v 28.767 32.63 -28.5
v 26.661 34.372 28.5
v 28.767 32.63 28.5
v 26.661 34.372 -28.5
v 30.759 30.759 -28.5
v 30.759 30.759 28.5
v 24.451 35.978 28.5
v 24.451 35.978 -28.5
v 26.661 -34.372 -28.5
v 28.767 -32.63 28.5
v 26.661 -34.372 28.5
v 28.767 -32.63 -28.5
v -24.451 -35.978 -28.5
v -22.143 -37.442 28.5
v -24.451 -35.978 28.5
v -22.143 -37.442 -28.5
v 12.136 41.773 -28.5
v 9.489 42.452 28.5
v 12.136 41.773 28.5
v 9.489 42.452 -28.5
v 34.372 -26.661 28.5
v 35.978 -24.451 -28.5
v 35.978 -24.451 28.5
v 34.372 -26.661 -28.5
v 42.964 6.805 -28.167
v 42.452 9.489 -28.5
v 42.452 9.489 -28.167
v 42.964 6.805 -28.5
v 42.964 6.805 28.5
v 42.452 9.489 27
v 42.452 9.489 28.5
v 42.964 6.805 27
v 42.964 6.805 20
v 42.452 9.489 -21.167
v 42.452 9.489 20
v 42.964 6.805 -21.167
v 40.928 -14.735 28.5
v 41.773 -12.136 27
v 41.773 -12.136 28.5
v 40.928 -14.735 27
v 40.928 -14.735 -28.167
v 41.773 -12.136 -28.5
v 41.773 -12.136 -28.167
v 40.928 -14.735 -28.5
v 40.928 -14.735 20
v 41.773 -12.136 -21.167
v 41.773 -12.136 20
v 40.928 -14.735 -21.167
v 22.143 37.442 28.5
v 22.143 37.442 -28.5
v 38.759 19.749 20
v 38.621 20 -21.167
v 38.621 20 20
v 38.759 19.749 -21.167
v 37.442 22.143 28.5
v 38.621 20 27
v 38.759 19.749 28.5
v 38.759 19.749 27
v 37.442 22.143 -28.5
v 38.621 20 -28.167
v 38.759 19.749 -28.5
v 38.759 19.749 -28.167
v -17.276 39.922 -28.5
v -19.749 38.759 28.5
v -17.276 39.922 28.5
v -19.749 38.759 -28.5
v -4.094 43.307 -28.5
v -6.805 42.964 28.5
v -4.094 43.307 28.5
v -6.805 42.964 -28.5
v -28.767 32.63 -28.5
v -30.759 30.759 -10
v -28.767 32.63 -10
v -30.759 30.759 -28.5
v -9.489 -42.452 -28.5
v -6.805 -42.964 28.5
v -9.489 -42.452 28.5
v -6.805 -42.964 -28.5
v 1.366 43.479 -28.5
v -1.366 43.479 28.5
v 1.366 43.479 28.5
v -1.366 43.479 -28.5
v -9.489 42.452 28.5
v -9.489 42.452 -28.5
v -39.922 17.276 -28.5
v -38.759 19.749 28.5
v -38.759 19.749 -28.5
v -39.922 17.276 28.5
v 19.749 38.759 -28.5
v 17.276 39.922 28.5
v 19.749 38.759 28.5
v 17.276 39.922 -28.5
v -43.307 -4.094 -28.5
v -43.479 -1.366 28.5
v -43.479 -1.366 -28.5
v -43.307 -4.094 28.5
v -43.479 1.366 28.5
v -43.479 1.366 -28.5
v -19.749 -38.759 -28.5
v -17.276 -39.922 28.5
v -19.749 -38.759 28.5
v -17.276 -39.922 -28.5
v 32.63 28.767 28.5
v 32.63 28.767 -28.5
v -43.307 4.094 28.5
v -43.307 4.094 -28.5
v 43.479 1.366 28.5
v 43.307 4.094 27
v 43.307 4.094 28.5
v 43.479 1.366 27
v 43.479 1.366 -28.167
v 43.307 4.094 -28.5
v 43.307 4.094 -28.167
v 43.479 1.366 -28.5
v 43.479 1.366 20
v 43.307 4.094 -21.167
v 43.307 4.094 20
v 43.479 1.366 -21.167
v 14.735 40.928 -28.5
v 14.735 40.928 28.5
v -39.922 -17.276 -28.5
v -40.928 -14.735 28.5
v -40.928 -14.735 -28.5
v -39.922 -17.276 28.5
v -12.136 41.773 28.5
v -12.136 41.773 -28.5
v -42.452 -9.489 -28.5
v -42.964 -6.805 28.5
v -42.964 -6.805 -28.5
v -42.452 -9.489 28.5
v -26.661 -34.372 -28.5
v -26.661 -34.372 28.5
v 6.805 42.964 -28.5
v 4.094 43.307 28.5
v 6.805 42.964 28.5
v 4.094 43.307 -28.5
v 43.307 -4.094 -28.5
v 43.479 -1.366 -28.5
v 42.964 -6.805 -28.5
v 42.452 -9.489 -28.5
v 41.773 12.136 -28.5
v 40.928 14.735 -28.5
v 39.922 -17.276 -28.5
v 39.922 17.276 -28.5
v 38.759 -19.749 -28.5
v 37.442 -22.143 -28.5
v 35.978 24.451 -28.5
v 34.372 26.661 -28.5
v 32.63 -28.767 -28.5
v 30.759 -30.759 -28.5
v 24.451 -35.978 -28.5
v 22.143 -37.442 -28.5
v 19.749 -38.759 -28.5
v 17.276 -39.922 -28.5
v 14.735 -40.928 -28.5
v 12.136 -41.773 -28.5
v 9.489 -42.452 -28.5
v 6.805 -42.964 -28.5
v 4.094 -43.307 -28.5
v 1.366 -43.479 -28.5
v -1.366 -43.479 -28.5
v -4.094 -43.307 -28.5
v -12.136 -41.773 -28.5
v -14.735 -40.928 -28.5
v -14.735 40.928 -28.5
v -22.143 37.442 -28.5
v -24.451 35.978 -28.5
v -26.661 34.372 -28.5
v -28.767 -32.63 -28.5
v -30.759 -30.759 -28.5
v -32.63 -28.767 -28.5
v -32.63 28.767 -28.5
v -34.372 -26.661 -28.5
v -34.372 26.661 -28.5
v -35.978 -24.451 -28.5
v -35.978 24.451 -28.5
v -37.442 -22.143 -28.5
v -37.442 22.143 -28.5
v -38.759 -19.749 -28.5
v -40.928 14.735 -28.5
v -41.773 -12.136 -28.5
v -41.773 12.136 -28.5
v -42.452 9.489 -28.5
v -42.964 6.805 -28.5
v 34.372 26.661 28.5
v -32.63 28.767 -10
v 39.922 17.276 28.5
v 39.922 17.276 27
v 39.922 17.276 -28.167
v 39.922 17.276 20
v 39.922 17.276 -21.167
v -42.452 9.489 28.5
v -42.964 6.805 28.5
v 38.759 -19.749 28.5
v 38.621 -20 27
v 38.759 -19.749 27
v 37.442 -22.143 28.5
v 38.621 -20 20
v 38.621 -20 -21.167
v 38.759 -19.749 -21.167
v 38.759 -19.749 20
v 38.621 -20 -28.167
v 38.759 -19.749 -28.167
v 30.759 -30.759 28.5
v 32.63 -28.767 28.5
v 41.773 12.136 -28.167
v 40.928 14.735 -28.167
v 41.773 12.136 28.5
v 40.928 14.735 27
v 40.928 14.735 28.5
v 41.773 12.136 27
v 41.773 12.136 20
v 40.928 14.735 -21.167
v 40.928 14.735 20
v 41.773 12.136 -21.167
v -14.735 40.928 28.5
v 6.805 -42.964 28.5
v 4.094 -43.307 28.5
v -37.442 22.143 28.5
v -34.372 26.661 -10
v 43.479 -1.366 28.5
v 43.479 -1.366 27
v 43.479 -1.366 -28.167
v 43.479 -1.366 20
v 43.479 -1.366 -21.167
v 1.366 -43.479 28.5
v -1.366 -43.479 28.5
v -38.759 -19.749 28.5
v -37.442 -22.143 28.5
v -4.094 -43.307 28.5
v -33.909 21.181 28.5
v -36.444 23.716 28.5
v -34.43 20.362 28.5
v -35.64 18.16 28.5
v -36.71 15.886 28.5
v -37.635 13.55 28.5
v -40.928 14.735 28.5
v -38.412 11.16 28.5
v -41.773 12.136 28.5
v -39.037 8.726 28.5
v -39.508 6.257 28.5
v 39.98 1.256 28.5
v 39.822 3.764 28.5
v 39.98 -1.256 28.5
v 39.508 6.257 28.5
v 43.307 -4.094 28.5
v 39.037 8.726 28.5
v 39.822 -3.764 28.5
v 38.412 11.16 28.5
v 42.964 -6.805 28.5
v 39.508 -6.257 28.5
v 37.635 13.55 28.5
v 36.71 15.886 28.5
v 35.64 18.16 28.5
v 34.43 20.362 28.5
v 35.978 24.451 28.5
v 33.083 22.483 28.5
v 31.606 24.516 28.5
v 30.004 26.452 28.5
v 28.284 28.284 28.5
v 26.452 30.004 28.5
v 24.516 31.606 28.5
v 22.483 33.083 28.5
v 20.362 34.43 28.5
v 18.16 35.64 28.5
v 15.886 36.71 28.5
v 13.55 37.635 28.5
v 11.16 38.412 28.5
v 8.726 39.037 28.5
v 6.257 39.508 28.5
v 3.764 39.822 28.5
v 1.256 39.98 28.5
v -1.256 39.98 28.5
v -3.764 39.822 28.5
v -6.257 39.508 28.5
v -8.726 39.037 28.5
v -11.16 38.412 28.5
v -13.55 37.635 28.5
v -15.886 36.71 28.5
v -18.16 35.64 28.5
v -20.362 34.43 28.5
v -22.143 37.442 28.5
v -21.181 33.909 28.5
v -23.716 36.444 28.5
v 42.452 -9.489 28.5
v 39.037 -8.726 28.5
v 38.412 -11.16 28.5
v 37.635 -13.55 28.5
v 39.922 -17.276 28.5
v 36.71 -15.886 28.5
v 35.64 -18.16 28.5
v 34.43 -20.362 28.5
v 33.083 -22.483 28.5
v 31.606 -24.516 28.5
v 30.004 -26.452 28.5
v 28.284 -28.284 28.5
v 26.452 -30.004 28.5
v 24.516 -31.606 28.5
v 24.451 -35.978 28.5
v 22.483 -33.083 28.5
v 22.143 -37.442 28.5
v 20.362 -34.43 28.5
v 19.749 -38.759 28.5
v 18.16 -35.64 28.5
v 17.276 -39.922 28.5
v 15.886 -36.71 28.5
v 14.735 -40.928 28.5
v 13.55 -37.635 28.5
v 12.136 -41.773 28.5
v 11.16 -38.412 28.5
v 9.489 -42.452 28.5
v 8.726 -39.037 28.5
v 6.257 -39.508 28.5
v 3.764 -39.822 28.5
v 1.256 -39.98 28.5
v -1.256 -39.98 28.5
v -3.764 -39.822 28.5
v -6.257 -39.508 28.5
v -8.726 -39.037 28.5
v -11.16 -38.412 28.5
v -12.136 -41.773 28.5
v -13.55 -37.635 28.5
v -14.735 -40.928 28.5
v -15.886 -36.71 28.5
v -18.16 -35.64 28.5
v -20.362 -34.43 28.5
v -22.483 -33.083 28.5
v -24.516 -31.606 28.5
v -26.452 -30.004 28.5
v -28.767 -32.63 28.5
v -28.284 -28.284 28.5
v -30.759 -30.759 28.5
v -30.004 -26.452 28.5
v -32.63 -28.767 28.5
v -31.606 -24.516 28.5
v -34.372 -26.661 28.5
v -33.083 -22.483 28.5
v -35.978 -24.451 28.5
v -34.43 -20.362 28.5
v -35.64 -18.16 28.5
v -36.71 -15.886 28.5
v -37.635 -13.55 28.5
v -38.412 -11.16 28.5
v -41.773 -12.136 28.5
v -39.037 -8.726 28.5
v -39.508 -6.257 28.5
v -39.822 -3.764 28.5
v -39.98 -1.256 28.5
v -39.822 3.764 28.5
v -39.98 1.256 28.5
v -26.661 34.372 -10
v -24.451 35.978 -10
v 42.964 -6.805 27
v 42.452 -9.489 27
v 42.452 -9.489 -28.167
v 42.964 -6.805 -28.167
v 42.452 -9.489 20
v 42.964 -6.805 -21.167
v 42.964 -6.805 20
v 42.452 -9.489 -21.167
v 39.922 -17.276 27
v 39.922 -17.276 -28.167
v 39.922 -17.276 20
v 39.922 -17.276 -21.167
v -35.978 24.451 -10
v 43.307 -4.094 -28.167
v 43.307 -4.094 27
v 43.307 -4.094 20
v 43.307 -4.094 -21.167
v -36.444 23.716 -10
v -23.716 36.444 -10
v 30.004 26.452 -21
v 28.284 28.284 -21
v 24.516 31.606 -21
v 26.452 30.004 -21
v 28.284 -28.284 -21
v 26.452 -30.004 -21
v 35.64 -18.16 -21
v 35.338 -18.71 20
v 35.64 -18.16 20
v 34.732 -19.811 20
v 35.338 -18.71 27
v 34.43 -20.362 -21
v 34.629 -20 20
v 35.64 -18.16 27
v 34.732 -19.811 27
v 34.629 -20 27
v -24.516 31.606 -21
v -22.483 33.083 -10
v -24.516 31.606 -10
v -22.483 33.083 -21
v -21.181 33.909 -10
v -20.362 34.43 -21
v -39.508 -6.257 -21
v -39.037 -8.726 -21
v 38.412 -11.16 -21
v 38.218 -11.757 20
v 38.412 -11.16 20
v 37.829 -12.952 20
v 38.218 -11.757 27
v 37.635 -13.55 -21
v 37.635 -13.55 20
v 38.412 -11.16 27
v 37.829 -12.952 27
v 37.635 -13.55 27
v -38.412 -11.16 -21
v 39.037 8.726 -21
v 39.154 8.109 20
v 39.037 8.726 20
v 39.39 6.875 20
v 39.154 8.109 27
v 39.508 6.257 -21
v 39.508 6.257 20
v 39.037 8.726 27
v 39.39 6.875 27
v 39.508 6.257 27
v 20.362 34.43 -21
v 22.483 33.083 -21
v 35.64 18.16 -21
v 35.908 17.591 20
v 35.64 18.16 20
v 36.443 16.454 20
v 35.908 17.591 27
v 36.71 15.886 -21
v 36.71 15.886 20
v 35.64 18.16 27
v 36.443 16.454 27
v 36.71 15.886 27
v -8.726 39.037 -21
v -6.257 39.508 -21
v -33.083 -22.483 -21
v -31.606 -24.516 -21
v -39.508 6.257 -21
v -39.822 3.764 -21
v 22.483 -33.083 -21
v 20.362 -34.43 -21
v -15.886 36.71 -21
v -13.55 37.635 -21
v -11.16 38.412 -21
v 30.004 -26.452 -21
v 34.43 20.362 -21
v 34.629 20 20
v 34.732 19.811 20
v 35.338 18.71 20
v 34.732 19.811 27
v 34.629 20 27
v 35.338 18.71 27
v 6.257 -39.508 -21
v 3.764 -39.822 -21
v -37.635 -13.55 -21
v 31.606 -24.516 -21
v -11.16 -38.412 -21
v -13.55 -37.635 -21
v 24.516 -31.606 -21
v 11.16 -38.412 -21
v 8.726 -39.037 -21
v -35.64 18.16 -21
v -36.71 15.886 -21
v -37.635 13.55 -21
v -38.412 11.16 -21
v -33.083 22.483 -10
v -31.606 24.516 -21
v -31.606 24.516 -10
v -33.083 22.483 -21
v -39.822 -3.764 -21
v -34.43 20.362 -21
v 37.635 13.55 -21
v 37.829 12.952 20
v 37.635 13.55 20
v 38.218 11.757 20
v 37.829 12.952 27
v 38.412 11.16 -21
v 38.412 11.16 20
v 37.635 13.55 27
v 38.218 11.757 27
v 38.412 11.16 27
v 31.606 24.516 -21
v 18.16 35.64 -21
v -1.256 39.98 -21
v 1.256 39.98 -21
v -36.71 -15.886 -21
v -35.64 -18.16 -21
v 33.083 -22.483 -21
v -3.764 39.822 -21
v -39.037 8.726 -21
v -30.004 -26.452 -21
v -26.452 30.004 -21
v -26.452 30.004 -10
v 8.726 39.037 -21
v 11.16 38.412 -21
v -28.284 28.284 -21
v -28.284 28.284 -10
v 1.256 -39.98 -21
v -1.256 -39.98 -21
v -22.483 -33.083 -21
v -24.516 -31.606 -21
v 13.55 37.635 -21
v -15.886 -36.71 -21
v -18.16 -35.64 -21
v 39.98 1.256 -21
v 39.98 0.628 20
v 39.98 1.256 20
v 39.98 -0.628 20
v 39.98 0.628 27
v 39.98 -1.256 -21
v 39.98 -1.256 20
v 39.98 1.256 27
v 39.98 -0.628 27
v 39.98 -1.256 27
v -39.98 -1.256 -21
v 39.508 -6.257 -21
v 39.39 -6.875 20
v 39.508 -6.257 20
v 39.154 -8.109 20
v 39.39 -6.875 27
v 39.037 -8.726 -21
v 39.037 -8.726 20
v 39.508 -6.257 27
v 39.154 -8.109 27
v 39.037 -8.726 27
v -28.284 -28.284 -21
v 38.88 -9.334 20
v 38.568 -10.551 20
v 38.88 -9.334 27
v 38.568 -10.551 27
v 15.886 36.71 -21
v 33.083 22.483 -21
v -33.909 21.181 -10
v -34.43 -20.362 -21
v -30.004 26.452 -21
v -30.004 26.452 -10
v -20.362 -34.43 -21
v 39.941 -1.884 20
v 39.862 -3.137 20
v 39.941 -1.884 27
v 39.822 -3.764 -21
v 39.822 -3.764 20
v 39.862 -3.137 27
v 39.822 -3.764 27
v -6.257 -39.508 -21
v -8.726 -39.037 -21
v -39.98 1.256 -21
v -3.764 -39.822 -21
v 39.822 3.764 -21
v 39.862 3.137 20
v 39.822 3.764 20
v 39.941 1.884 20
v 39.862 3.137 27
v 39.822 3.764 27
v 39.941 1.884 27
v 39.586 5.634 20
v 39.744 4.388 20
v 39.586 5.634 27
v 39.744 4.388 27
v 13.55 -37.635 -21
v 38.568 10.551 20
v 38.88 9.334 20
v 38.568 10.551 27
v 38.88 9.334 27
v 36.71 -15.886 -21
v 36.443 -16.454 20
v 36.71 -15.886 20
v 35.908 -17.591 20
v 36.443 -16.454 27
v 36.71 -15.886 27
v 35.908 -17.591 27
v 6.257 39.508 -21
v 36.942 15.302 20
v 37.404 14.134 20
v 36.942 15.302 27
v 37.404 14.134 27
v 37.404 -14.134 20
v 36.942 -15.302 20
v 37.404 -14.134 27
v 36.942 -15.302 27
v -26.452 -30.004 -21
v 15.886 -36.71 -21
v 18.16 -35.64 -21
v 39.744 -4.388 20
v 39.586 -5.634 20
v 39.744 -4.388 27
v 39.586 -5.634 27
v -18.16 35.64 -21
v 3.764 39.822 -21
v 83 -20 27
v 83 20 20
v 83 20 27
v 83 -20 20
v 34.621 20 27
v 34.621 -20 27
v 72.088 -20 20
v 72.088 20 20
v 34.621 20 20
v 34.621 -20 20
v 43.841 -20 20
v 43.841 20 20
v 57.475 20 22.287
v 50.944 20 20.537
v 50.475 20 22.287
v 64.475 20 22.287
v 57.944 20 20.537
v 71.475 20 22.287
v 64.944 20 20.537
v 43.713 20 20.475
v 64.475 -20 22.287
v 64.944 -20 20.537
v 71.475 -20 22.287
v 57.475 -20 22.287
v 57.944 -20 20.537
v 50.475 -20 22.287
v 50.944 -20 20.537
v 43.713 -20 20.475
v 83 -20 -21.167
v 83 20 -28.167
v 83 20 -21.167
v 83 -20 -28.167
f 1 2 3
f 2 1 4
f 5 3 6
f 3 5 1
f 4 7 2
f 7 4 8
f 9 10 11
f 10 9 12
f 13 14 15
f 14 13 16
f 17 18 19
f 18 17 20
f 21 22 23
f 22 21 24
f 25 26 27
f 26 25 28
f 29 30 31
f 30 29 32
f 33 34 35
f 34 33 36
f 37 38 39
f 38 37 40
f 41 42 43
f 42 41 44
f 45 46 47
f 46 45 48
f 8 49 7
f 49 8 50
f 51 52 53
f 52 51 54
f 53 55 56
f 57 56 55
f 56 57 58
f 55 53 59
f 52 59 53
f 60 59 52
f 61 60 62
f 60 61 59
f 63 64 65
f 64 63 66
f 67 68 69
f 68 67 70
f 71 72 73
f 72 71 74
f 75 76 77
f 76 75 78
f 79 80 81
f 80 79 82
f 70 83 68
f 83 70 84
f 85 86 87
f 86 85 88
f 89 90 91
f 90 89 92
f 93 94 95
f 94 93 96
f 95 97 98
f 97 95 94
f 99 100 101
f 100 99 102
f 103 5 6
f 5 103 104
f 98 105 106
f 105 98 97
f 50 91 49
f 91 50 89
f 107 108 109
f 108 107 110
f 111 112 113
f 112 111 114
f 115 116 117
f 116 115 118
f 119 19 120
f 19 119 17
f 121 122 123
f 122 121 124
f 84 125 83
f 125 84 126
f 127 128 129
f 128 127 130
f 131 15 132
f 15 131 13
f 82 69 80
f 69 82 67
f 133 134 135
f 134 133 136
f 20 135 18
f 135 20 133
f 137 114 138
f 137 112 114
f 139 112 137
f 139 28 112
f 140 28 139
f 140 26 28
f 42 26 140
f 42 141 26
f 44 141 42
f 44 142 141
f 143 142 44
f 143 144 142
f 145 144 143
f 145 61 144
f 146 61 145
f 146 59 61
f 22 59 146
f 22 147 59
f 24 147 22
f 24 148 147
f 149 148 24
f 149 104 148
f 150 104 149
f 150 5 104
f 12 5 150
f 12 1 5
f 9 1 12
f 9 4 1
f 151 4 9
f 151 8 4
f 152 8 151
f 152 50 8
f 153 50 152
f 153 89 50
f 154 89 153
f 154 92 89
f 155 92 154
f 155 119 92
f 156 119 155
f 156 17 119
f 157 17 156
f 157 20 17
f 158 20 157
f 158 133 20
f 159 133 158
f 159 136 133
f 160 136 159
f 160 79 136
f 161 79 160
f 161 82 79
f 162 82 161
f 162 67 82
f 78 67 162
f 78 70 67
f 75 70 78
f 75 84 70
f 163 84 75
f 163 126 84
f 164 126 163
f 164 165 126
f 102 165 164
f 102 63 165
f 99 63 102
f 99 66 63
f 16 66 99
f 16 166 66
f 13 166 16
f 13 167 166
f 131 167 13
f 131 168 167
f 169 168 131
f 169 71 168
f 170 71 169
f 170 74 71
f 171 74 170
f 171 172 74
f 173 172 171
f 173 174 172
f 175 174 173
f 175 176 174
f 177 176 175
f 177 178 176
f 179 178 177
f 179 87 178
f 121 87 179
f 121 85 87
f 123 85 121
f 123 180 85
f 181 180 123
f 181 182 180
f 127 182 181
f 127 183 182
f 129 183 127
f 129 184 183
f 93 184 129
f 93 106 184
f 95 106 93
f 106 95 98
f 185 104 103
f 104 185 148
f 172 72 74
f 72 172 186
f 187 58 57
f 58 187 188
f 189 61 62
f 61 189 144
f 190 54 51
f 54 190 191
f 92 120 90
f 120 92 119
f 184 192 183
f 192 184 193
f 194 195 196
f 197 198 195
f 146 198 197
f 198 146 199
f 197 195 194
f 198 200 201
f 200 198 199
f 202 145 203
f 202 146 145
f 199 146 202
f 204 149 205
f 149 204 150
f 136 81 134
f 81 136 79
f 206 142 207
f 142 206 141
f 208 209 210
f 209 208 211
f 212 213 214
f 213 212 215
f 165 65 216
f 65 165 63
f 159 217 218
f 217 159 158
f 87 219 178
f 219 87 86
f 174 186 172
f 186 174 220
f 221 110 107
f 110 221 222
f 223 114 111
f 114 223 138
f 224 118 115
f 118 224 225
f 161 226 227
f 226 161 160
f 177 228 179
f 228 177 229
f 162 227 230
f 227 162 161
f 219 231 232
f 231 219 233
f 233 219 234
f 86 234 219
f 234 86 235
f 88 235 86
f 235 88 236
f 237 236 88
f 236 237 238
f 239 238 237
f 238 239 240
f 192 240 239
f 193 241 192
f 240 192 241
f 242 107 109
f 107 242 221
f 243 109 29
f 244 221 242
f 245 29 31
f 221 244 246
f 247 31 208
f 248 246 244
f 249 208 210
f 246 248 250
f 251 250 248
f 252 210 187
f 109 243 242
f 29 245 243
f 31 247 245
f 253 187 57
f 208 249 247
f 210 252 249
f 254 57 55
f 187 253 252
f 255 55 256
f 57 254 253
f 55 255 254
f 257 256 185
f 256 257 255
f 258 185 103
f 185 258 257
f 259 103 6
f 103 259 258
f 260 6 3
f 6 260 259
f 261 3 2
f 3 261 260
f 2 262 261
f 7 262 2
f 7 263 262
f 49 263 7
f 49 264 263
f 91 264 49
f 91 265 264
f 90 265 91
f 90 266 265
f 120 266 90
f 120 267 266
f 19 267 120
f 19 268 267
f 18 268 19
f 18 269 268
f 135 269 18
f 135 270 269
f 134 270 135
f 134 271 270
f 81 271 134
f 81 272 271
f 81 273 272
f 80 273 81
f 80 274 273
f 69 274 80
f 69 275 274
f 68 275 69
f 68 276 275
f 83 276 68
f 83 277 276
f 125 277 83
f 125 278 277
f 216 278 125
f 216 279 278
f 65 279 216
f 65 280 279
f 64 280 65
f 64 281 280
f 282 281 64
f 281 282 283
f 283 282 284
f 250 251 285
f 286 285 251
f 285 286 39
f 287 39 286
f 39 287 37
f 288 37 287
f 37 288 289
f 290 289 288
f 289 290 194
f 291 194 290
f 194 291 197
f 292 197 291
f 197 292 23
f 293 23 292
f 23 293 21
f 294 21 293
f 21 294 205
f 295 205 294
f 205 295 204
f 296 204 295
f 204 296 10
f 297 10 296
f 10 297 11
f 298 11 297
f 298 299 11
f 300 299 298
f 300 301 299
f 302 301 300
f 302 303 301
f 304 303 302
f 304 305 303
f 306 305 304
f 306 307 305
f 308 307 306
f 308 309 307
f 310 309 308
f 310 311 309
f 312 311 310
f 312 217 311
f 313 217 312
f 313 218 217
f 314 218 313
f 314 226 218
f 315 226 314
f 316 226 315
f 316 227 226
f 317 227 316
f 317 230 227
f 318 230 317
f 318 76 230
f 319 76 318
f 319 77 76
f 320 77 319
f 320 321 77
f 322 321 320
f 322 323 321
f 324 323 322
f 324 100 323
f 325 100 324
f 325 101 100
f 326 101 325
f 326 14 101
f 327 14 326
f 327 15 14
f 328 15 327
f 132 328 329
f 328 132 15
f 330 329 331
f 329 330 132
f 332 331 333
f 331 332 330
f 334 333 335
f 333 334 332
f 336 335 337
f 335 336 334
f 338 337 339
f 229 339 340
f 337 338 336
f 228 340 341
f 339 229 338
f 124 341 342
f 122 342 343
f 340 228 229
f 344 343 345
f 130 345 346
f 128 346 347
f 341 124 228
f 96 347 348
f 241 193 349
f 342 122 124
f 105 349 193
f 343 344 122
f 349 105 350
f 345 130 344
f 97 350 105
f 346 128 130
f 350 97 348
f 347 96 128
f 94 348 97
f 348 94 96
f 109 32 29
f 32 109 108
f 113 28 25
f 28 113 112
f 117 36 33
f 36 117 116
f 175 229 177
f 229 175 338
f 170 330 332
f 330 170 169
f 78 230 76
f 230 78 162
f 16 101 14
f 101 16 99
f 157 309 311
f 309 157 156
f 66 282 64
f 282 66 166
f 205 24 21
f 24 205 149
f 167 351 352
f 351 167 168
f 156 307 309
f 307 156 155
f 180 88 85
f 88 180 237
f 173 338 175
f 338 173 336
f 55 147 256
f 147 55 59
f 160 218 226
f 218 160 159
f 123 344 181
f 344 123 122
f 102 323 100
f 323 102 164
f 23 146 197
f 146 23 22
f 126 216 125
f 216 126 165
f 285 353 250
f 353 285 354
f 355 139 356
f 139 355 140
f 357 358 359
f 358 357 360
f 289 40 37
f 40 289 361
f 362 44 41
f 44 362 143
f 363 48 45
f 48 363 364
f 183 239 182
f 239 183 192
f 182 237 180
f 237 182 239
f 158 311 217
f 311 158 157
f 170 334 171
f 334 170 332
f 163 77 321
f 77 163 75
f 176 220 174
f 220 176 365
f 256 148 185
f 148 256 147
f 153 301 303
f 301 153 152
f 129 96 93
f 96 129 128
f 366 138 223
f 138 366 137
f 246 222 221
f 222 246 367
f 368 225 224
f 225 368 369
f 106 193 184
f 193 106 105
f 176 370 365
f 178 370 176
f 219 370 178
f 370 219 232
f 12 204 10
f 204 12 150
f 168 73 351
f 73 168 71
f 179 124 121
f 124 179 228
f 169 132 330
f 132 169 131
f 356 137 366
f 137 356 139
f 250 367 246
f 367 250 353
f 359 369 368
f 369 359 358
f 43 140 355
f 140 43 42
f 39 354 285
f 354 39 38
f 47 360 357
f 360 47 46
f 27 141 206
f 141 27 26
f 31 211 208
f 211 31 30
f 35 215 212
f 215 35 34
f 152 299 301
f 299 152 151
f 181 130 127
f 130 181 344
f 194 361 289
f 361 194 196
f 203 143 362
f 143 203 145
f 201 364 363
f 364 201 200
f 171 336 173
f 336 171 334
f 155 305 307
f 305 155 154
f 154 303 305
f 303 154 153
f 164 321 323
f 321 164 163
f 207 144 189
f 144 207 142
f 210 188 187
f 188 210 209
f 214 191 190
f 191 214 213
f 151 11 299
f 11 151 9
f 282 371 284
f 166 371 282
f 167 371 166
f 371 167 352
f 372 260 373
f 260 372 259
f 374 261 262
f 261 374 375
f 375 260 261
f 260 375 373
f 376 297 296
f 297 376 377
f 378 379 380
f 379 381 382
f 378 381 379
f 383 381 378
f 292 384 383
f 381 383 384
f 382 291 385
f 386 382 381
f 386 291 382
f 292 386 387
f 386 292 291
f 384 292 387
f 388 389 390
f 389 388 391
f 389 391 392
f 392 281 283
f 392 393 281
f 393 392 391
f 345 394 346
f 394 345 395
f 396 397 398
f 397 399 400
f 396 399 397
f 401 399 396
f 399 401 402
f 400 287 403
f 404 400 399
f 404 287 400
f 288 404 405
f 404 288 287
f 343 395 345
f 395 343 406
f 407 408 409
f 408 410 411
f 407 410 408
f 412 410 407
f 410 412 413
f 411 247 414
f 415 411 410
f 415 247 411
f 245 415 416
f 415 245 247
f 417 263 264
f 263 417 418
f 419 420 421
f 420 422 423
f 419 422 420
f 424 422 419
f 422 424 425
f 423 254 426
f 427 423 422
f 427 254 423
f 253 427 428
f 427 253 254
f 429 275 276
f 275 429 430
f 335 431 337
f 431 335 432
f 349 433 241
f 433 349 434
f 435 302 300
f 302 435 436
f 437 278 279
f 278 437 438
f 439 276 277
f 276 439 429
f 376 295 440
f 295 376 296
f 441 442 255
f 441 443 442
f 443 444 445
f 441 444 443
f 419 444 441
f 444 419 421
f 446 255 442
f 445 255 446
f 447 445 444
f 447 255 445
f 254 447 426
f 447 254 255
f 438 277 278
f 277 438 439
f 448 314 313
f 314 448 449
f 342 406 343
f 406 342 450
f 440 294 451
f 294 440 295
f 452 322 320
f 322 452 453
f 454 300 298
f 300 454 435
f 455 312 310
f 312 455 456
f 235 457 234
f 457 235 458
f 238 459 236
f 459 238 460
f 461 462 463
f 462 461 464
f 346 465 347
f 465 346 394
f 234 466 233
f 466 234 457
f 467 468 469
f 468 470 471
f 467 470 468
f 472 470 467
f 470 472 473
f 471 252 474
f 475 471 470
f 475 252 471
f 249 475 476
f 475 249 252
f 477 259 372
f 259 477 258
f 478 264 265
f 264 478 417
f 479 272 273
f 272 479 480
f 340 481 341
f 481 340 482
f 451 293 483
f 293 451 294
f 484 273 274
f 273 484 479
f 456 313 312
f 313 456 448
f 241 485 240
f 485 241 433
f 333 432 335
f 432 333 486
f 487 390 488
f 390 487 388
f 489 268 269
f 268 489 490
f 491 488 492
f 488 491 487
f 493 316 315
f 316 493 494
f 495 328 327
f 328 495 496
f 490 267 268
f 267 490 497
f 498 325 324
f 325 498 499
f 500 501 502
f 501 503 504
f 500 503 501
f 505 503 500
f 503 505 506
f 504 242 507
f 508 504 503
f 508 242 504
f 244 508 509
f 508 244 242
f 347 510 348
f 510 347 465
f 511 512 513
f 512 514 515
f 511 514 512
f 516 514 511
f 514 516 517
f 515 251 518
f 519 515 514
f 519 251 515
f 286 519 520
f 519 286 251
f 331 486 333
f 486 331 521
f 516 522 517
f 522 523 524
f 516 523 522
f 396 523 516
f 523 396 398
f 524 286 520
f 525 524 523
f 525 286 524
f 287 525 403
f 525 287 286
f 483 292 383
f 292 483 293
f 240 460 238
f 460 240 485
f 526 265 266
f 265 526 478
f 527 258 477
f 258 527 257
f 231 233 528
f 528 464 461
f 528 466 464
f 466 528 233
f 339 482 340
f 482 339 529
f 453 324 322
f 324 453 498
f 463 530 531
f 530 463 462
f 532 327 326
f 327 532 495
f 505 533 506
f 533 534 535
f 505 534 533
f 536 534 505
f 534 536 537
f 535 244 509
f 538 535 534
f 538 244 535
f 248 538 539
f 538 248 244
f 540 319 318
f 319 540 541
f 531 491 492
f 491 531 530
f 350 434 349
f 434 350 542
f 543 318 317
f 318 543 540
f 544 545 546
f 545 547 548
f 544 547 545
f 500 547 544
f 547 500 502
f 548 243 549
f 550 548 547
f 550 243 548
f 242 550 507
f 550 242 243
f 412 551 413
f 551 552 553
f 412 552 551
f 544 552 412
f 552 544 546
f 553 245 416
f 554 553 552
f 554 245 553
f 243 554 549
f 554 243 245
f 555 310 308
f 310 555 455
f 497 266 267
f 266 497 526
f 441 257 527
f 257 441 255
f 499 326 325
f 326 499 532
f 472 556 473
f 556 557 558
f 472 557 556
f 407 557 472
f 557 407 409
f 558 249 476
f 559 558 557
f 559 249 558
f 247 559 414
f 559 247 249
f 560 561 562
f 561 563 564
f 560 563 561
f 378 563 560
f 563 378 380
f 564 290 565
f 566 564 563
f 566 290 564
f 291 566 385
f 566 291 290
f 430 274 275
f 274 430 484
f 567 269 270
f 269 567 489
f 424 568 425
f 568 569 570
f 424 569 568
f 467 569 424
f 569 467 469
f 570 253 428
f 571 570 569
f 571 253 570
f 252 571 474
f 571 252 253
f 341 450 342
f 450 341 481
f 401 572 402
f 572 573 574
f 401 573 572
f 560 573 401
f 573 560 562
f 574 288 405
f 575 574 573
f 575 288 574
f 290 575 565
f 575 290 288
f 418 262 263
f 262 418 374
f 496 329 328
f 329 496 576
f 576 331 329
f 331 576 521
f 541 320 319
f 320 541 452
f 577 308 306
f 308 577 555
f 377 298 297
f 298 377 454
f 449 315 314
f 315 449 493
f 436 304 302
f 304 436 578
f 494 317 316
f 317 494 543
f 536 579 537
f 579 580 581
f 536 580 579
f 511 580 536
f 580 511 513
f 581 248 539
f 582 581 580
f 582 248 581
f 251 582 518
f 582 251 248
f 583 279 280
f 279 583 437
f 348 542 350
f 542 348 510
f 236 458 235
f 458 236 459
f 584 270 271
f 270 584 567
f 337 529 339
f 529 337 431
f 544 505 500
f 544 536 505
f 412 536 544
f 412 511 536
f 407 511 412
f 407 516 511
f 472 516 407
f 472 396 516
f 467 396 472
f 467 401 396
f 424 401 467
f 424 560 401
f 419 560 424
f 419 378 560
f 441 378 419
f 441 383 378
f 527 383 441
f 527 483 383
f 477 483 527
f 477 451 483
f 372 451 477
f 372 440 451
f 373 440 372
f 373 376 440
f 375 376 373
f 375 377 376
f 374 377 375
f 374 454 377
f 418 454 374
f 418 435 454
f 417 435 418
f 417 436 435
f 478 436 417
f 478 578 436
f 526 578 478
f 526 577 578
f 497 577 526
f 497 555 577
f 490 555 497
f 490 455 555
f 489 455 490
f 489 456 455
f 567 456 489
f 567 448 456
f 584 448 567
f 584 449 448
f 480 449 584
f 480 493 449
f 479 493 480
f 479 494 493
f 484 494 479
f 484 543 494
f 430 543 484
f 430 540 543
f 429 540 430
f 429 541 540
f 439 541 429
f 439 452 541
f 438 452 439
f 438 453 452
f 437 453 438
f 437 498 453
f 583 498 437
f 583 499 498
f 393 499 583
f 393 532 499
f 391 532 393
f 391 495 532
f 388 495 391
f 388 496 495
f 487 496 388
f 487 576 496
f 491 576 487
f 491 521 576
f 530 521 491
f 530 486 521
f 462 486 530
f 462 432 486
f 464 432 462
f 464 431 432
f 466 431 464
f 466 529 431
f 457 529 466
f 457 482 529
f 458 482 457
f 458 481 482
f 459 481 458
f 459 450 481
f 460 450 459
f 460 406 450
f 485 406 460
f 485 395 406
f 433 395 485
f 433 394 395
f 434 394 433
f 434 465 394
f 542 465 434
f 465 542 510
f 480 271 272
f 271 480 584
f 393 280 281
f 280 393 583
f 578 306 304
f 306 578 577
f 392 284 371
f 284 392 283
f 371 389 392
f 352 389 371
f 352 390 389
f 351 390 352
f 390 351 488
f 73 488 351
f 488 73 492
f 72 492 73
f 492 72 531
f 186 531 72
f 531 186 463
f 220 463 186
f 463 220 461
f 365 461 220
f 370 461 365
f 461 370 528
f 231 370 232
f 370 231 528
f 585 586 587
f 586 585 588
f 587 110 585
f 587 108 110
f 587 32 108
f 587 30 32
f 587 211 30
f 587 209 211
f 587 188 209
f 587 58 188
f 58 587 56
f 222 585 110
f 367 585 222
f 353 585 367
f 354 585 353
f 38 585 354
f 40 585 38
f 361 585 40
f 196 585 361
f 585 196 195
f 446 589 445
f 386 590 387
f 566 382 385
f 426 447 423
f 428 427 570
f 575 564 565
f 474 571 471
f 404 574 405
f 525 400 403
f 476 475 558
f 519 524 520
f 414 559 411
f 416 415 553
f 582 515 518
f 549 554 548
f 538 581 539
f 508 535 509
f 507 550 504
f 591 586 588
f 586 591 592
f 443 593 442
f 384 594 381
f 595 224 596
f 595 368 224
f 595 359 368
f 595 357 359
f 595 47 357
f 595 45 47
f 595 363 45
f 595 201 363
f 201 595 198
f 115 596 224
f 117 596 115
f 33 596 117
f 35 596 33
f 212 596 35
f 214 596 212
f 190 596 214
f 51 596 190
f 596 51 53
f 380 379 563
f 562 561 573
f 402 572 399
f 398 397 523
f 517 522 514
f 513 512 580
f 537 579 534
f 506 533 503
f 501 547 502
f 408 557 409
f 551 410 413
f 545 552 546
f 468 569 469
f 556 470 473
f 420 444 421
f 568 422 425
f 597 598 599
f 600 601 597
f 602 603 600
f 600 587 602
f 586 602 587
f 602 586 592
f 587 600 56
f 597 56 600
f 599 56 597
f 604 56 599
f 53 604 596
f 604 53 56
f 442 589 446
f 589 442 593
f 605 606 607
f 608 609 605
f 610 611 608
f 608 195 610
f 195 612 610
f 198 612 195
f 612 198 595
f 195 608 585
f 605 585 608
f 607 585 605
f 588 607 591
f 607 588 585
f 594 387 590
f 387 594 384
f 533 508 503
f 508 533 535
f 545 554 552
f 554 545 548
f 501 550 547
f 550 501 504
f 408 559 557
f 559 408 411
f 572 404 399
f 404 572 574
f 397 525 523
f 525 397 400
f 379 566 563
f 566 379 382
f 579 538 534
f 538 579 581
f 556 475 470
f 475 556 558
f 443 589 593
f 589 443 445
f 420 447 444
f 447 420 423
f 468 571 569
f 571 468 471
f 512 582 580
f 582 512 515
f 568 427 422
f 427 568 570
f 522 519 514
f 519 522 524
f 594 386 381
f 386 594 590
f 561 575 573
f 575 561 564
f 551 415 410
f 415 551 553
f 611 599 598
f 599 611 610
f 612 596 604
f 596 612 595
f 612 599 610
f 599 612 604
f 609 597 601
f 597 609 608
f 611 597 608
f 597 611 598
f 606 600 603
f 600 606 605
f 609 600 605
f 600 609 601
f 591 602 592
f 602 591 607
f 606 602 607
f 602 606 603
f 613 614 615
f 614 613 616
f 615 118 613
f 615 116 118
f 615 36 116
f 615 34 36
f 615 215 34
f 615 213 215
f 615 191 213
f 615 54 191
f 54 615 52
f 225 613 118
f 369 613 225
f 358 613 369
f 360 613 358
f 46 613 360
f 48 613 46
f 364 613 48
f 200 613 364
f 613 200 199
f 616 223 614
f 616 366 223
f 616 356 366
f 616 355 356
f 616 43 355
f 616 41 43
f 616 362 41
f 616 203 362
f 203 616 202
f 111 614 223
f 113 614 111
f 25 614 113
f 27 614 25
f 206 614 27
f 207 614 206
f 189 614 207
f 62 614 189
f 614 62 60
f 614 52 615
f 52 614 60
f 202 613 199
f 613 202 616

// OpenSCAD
/*
 Tasse
 8cm Durchmesser
 5cm Höhe
 1.8cm Henkel

 Tisch
 4cm Tischplatte
*/

thickness = 7;

cupdia = 80;
cupheight = 50;
cupholder = 18;

table = 40;
$fn = 100;

// Cupholder

module cupholder(){
difference(){
cylinder(h = cupheight + thickness, center = true, d = cupdia + thickness);
translate([0,0,(thickness + 1)/ 2]){
cylinder(h = cupheight, center = true, d = cupdia);
}
translate([0, cupdia / 2 , cupheight / 5]){
cube([cupholder, cupdia, (cupheight / 10) * 8], center = true);
}
}
}

// Tableholder

module tableholder () {
cube([table + 10, cupdia / 2, thickness], center = true);
}

module snap () {
    translate([cupdia/5 * 3, 0 ,cupheight / 2 - thickness]) rotate([0, 75, 0]) cube([thickness, cupdia, thickness], center = true);
}

union(){
rotate([0, 0, 45])cupholder();
difference(){
    translate([(cupdia / 2) + ((table + 10) / 2) - thickness, 0, table / 2 + thickness / 2])tableholder();
    translate([0,0,(thickness + 1)/ 2]) cylinder(h = cupheight, center = true, d = cupdia);
    snap();
    translate([thickness, 0 , 0]) snap();
    translate([thickness * 2, 0 , 0]) snap();
    translate([thickness * 3, 0 , 0]) snap();
    
}
difference(){
    translate([(cupdia / 2) + ((table + 10) / 2) - thickness, 0, -(table / 2 + thickness / 3 * 2)]) tableholder();
    translate([0,0,(thickness + 1)/ 2]) cylinder(h = cupheight, center = true, d = cupdia);
}
}
